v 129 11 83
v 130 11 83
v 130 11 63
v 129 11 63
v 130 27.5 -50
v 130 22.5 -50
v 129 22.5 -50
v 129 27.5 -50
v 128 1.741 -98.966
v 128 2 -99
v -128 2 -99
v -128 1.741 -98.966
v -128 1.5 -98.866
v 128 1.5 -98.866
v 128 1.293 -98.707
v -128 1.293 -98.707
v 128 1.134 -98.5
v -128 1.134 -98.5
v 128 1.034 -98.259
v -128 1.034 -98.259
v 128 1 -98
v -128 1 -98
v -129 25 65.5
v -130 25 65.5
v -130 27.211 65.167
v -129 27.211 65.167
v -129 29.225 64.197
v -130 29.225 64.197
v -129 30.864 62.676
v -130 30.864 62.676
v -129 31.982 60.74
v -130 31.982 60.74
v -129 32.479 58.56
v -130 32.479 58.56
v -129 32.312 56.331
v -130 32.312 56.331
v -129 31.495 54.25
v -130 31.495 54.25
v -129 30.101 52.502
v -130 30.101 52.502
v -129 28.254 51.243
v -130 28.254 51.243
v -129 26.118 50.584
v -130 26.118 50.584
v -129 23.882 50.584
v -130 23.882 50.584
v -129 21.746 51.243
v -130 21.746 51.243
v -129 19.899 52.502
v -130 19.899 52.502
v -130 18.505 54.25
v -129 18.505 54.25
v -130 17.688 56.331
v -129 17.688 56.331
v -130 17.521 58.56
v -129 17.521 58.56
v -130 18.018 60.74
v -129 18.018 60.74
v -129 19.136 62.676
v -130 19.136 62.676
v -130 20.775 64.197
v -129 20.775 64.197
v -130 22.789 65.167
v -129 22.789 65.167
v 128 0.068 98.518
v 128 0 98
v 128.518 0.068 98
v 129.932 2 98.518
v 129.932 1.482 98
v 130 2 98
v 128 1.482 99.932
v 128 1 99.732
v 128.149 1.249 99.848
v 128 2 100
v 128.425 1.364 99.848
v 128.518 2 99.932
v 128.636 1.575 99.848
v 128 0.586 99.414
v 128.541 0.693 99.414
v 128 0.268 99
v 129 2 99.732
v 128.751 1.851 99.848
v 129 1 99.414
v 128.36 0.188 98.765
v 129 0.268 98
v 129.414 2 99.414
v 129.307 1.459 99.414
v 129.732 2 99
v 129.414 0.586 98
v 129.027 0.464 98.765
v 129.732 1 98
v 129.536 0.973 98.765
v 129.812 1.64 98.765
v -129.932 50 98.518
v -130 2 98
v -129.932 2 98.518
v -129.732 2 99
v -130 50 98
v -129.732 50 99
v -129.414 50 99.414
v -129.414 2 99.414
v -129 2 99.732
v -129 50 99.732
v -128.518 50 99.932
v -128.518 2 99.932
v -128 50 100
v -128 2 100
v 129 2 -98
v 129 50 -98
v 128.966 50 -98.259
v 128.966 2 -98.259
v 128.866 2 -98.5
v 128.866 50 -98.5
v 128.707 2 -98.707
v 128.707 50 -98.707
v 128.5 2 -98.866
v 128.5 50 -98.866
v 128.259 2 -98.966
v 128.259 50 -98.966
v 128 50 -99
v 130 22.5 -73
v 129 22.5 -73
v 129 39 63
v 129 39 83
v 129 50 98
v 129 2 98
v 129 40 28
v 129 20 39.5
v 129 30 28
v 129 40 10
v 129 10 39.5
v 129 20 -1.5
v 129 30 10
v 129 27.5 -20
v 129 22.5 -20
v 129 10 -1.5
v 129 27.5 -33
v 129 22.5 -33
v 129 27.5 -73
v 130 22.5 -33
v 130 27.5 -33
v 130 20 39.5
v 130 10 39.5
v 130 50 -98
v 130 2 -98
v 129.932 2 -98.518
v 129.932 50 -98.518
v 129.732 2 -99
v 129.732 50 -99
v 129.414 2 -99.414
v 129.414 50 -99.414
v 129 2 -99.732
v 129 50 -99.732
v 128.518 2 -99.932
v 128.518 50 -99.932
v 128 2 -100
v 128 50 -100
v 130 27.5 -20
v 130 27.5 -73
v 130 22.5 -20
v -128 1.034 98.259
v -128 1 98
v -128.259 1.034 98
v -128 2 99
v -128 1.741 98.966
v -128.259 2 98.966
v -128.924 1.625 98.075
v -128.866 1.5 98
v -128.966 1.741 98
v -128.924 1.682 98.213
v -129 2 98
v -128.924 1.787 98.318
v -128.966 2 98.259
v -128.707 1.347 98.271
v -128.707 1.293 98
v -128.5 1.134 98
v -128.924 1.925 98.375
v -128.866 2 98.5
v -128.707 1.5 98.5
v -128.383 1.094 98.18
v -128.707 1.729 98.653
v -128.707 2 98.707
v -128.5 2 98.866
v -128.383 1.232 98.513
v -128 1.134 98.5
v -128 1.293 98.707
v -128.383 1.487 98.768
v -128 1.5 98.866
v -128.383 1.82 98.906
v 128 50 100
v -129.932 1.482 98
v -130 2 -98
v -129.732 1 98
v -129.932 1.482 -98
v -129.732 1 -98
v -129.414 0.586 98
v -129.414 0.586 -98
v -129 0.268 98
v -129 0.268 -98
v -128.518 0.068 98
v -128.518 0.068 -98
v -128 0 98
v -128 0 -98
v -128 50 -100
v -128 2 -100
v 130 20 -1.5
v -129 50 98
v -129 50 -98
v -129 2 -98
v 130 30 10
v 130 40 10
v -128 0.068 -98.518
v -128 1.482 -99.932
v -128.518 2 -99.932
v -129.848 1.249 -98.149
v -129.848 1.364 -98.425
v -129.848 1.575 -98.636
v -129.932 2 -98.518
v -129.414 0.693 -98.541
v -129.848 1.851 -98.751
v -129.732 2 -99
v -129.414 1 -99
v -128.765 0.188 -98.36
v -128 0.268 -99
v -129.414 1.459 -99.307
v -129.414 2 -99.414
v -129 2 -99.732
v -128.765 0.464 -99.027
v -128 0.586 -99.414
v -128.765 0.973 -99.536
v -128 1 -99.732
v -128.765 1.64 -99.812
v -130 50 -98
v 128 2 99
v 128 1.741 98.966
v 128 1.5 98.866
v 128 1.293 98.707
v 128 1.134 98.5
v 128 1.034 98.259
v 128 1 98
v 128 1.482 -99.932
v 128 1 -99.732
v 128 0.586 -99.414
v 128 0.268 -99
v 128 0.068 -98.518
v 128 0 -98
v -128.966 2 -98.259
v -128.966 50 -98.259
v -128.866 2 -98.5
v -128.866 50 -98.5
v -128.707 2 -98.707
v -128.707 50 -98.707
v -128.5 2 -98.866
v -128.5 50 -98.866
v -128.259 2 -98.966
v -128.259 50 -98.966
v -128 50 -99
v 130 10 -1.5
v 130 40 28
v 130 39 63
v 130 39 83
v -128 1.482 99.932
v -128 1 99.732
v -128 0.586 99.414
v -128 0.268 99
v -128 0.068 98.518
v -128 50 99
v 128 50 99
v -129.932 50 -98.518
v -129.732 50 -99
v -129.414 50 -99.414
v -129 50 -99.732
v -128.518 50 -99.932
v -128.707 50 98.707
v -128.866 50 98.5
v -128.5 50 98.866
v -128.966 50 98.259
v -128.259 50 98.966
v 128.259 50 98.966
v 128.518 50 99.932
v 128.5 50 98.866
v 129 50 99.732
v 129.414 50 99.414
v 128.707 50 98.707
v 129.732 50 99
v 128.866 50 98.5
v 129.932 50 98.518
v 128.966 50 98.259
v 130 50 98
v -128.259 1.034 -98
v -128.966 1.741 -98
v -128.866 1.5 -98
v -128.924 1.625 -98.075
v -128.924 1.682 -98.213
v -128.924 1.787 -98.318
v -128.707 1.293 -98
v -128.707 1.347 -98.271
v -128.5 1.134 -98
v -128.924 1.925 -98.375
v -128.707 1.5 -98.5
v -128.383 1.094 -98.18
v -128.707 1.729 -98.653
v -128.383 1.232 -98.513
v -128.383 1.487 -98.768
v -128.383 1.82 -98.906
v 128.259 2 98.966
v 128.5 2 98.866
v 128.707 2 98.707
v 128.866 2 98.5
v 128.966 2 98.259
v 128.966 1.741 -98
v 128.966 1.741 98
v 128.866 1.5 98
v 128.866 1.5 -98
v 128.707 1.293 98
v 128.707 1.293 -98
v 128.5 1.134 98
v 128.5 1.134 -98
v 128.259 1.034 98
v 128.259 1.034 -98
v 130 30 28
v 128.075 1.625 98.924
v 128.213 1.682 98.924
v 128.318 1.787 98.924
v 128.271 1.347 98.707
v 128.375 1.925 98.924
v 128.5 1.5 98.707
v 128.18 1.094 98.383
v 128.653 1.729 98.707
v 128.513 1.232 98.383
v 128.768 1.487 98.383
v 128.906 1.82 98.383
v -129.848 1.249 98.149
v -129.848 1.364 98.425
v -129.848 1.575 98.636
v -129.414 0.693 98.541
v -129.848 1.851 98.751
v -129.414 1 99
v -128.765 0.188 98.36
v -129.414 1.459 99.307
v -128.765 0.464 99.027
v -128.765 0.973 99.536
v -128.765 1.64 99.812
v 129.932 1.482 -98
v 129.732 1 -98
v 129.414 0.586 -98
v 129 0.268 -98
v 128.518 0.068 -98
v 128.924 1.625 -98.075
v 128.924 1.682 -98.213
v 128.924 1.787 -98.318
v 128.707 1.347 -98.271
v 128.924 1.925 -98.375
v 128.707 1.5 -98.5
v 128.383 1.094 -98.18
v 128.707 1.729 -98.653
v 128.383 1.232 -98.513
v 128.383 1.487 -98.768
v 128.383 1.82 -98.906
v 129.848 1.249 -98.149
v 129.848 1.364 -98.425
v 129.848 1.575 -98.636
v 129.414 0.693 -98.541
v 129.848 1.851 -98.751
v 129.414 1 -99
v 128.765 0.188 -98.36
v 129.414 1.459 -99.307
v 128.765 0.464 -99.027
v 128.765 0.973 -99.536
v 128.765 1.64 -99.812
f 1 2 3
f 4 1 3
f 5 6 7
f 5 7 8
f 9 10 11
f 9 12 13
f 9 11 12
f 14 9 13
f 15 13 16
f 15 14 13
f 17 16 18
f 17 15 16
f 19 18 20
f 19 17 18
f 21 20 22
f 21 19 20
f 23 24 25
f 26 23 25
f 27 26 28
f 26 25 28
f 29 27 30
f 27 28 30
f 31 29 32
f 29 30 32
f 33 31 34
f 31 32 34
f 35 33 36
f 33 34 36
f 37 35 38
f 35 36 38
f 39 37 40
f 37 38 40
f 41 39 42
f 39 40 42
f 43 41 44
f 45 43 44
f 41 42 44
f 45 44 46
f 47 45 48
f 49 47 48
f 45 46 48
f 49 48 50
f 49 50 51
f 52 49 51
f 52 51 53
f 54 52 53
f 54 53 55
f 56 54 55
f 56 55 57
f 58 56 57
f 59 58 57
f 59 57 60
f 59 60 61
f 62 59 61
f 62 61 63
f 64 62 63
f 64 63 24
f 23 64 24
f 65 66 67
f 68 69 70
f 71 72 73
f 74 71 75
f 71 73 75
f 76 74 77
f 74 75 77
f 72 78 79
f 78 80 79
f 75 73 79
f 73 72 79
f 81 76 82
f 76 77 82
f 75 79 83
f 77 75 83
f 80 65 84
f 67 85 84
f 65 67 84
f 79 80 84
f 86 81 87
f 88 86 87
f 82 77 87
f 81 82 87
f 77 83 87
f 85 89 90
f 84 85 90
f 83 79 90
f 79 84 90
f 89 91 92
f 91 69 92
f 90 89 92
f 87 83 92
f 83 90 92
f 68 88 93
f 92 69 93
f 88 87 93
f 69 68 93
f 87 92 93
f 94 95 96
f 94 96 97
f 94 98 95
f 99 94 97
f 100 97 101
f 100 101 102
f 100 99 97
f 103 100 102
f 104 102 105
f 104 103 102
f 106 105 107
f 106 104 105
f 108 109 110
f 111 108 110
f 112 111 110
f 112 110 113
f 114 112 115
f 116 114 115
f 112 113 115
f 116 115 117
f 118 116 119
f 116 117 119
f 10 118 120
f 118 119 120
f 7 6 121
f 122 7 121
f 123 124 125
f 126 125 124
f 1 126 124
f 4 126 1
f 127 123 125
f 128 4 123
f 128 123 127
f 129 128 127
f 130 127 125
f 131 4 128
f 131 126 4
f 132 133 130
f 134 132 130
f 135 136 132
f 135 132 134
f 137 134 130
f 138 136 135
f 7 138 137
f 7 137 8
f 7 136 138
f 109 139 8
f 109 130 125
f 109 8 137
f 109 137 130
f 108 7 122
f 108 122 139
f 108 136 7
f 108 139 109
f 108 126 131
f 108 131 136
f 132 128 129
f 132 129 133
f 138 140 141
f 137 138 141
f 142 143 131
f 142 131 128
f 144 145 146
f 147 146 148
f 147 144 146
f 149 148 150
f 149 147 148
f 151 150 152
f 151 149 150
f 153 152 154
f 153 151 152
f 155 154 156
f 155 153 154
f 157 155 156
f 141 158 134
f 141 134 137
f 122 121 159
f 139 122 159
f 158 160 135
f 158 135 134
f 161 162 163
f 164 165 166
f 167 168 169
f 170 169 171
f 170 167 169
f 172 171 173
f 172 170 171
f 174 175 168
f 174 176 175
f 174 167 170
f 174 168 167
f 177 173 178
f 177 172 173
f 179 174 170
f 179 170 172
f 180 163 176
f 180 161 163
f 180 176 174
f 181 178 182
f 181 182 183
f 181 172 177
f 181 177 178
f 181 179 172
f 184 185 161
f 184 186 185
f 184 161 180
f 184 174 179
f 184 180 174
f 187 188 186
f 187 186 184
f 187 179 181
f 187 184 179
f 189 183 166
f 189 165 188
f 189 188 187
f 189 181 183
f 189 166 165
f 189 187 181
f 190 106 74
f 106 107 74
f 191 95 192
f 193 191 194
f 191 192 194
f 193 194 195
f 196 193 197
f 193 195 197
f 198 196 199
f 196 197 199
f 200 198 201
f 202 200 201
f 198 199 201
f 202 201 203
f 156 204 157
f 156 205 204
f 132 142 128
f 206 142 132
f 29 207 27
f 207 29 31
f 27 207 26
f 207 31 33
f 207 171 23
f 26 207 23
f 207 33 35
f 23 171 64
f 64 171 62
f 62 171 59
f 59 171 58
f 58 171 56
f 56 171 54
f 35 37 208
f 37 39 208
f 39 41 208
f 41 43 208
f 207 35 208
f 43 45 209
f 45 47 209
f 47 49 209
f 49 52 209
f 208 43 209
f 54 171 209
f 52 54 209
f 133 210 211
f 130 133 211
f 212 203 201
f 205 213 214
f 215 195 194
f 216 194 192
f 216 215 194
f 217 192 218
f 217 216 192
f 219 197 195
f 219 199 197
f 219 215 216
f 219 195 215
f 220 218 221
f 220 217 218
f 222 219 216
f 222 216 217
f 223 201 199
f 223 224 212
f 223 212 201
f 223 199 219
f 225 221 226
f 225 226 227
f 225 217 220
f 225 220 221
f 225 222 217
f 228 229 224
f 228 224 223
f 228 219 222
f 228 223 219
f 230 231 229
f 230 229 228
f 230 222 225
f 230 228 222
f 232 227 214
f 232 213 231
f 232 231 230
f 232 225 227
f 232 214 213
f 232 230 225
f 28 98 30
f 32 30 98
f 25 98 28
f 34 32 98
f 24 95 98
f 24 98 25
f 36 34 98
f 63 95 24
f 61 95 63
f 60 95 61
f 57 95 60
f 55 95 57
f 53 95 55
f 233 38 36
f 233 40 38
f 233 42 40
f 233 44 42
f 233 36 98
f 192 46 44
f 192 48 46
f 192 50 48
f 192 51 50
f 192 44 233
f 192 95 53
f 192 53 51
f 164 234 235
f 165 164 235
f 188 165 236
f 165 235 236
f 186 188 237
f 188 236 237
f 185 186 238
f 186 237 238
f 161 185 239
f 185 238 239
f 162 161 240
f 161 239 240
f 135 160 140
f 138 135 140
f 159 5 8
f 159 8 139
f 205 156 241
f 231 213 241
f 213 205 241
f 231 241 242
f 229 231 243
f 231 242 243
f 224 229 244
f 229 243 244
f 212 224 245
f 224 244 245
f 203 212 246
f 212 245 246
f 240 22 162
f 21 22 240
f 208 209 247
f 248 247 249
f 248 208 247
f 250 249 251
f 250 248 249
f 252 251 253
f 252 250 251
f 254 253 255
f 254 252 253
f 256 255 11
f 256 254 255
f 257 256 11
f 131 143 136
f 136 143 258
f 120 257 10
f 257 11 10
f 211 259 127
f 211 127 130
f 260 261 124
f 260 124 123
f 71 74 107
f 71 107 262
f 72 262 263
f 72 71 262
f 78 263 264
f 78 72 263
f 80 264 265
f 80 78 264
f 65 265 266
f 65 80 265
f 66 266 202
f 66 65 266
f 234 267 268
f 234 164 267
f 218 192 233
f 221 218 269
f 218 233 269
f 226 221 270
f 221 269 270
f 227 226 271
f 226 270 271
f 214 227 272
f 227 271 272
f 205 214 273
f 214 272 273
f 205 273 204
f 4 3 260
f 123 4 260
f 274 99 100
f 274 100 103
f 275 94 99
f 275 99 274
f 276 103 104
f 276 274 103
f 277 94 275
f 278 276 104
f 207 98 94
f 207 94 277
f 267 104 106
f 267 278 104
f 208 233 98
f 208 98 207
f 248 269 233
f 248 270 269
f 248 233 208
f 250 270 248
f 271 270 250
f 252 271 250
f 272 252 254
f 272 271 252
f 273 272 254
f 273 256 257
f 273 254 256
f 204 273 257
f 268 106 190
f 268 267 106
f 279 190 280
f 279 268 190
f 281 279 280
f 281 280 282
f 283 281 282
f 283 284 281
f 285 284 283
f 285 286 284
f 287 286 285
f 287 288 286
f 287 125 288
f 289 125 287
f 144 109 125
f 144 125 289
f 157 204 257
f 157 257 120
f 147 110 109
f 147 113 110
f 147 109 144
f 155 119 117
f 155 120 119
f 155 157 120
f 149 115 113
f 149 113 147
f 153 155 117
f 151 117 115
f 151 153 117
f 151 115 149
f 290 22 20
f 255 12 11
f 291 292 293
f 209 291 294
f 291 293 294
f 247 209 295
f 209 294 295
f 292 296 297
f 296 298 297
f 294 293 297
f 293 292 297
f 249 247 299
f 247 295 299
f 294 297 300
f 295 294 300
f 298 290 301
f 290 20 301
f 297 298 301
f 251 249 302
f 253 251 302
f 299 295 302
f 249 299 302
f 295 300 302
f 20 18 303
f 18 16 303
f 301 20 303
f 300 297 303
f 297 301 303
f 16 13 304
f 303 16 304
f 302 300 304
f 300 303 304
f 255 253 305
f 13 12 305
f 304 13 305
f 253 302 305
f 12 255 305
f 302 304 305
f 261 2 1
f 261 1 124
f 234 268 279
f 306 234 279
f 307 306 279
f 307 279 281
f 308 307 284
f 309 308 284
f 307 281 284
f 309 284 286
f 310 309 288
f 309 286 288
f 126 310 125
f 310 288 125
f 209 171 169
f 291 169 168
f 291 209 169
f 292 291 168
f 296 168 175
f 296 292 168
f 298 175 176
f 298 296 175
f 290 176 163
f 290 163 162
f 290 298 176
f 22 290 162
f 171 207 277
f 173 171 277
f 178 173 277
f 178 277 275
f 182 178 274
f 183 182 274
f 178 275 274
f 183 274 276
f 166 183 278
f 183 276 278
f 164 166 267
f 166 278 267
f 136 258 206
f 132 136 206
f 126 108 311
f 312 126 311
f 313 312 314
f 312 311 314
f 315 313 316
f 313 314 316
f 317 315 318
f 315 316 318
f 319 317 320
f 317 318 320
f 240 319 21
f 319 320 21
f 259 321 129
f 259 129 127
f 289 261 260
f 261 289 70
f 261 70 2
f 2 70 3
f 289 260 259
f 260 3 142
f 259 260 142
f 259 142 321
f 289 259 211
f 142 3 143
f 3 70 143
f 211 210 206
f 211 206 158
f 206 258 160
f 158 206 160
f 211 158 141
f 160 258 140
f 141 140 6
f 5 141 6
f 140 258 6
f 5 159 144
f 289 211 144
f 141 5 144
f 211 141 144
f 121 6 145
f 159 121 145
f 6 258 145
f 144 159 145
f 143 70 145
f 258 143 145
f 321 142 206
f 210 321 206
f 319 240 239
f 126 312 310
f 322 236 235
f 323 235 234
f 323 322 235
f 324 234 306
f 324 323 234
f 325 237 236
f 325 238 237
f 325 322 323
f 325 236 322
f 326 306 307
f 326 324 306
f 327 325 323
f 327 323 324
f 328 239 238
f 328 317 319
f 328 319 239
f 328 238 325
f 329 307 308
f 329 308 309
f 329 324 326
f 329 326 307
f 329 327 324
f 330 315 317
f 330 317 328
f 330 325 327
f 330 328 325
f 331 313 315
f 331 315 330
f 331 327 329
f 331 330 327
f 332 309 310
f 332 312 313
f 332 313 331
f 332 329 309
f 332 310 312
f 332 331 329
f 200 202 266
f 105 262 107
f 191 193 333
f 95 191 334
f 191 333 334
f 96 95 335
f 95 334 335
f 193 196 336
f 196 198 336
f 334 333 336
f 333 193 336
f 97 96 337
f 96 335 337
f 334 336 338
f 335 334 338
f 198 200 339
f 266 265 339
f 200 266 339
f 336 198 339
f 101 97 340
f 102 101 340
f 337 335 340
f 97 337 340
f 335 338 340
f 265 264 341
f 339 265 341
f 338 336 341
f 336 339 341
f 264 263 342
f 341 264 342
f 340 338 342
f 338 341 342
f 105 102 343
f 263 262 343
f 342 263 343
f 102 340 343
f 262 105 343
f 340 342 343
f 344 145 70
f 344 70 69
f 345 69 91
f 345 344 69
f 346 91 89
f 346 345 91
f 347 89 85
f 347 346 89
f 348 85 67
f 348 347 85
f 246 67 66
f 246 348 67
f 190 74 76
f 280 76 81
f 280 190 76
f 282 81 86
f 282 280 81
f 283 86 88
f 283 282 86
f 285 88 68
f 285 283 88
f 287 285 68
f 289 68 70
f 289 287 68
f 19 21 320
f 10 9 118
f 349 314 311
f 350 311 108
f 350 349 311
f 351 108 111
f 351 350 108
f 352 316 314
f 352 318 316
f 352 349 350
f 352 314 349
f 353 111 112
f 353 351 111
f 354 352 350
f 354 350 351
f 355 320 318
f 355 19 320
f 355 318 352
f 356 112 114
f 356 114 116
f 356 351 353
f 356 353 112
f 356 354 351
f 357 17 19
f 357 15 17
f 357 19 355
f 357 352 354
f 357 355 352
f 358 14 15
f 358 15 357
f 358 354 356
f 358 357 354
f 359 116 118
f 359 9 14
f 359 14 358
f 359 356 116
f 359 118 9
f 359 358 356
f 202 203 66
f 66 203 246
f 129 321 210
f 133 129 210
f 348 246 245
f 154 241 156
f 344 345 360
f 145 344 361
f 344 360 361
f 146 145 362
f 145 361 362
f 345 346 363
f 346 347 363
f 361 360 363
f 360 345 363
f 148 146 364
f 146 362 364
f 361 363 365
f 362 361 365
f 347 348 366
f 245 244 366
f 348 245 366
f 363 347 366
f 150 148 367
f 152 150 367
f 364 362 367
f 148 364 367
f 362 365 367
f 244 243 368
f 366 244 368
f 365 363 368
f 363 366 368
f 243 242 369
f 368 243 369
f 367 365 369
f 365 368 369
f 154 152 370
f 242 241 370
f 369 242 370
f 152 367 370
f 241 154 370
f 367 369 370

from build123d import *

# Parameters (mm, degrees)
SKETCH1_W           = 260
SKETCH1_H           = 200
BOSS_EXTRUDE1_DEPTH = 50
FILLET1_R           = 2
SHELL1_T            = -1
SKETCH2_W           = 41
SKETCH2_H           = 10
SKETCH2_W_2         = 18
SKETCH2_W_3         = 13
SKETCH2_H_2         = 5
SKETCH2_W_4         = 23
SKETCH2_W_5         = 20
SKETCH2_H_3         = 28
CUT_EXTRUDE1_DEPTH  = 50
SKETCH3_R           = 7.5
CUT_EXTRUDE2_DEPTH  = 50


with BuildPart() as part:
    # Sketch1 → Boss-Extrude1 (new body)
    with BuildSketch(Plane(origin=(0, 0, 0), x_dir=(1, 0, 0), z_dir=(0, 1, 0))):
        Rectangle(SKETCH1_W, SKETCH1_H)
    extrude(amount=BOSS_EXTRUDE1_DEPTH)

    # Fillet1
    fillet1_edges = [part.edges().sort_by_distance(p)[0] for p in [
        (0, 0, -100),
        (130, 0, 0),
        (0, 0, 100),
        (-130, 0, 0),
        (-130, 25, -100),
        (130, 25, -100),
        (130, 25, 100),
        (-130, 25, 100),
    ]]
    fillet(fillet1_edges, radius=FILLET1_R)

    # Shell1
    shell1_openings = [part.faces().sort_by_distance(p)[0] for p in [
        (0, 50, 0),
    ]]
    offset(amount=SHELL1_T, openings=shell1_openings, kind=Kind.INTERSECTION)

    # Sketch2 → Cut-Extrude1 (cut)
    with BuildSketch(Plane(origin=(130, 0, 0), x_dir=(0, 0, -1), z_dir=(1, 0, 0))):
        with Locations((-19, 15)):
            Rectangle(SKETCH2_W, SKETCH2_H)
        with Locations((-19, 35)):
            Rectangle(SKETCH2_W_2, SKETCH2_H)
        with Locations((26.5, 25)):
            Rectangle(SKETCH2_W_3, SKETCH2_H_2)
        with Locations((61.5, 25)):
            Rectangle(SKETCH2_W_4, SKETCH2_H_2)
        with Locations((-73, 25)):
            Rectangle(SKETCH2_W_5, SKETCH2_H_3)
    extrude(amount=-CUT_EXTRUDE1_DEPTH, mode=Mode.SUBTRACT)

    # Sketch3 → Cut-Extrude2 (cut)
    with BuildSketch(Plane.ZY.offset(130)):
        with Locations((58, 25)):
            Circle(SKETCH3_R)
    extrude(amount=-CUT_EXTRUDE2_DEPTH, mode=Mode.SUBTRACT)


solid = part.part
